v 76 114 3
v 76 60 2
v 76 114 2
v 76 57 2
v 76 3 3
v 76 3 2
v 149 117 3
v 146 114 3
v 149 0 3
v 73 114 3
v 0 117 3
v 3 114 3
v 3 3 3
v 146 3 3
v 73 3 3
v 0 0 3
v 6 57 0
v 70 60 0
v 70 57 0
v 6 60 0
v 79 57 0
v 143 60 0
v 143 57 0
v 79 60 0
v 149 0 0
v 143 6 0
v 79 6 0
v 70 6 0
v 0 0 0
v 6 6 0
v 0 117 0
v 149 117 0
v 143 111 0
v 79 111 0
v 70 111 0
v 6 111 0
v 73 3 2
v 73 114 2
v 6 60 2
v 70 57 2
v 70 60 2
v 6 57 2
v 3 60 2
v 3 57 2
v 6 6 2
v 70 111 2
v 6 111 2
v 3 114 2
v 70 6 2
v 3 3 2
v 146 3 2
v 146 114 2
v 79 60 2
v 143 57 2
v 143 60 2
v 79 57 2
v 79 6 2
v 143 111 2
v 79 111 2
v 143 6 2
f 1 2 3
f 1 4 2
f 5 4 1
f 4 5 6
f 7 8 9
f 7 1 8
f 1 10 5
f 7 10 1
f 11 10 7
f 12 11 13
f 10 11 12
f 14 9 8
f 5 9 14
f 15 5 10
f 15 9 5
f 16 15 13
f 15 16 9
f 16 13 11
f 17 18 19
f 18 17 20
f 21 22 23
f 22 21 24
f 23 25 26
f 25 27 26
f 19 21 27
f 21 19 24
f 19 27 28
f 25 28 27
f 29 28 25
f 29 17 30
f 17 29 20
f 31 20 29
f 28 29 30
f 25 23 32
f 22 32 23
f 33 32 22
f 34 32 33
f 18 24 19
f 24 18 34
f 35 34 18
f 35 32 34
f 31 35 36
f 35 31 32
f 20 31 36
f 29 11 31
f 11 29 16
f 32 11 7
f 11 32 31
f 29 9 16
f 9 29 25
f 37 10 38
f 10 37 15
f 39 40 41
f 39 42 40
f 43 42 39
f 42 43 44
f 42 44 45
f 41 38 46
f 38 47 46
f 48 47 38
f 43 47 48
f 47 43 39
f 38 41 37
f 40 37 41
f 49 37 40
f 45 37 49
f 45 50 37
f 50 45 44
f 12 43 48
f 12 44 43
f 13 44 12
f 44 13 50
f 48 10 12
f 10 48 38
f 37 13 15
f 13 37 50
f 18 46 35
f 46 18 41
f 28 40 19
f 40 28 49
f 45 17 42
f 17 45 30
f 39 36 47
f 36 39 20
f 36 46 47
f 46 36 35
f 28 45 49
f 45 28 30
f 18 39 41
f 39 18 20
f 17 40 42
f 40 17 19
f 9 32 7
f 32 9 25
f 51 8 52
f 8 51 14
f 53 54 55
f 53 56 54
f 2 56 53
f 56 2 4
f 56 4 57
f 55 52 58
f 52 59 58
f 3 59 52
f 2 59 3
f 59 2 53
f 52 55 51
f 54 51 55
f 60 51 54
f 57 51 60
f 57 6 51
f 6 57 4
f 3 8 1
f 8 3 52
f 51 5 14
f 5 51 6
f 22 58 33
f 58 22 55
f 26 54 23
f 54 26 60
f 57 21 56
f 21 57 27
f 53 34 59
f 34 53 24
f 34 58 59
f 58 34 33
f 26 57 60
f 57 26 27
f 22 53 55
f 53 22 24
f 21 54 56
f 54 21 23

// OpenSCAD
w = 70;
h = 111;

border = 3;
height = 3;
depth = 1;

num_x = 2;
num_y = 1;

for(x = [0:num_x-1]){
    for(y = [0:num_y-1]){
        translate([x*(w+border),y*(h+border),0])
        difference(){
            cube([w+2*border,h+2*border,height]);
            translate([border,border,height-depth]) cube([w,h,height]);
            translate([border*2,border*2,0]) cube([w-2*border,h-2*border,height]);
        }
        translate([x*(w+border),y*(h+border)+(border/2+h/2),0]) cube([w,border,height-depth]);

    }
}
